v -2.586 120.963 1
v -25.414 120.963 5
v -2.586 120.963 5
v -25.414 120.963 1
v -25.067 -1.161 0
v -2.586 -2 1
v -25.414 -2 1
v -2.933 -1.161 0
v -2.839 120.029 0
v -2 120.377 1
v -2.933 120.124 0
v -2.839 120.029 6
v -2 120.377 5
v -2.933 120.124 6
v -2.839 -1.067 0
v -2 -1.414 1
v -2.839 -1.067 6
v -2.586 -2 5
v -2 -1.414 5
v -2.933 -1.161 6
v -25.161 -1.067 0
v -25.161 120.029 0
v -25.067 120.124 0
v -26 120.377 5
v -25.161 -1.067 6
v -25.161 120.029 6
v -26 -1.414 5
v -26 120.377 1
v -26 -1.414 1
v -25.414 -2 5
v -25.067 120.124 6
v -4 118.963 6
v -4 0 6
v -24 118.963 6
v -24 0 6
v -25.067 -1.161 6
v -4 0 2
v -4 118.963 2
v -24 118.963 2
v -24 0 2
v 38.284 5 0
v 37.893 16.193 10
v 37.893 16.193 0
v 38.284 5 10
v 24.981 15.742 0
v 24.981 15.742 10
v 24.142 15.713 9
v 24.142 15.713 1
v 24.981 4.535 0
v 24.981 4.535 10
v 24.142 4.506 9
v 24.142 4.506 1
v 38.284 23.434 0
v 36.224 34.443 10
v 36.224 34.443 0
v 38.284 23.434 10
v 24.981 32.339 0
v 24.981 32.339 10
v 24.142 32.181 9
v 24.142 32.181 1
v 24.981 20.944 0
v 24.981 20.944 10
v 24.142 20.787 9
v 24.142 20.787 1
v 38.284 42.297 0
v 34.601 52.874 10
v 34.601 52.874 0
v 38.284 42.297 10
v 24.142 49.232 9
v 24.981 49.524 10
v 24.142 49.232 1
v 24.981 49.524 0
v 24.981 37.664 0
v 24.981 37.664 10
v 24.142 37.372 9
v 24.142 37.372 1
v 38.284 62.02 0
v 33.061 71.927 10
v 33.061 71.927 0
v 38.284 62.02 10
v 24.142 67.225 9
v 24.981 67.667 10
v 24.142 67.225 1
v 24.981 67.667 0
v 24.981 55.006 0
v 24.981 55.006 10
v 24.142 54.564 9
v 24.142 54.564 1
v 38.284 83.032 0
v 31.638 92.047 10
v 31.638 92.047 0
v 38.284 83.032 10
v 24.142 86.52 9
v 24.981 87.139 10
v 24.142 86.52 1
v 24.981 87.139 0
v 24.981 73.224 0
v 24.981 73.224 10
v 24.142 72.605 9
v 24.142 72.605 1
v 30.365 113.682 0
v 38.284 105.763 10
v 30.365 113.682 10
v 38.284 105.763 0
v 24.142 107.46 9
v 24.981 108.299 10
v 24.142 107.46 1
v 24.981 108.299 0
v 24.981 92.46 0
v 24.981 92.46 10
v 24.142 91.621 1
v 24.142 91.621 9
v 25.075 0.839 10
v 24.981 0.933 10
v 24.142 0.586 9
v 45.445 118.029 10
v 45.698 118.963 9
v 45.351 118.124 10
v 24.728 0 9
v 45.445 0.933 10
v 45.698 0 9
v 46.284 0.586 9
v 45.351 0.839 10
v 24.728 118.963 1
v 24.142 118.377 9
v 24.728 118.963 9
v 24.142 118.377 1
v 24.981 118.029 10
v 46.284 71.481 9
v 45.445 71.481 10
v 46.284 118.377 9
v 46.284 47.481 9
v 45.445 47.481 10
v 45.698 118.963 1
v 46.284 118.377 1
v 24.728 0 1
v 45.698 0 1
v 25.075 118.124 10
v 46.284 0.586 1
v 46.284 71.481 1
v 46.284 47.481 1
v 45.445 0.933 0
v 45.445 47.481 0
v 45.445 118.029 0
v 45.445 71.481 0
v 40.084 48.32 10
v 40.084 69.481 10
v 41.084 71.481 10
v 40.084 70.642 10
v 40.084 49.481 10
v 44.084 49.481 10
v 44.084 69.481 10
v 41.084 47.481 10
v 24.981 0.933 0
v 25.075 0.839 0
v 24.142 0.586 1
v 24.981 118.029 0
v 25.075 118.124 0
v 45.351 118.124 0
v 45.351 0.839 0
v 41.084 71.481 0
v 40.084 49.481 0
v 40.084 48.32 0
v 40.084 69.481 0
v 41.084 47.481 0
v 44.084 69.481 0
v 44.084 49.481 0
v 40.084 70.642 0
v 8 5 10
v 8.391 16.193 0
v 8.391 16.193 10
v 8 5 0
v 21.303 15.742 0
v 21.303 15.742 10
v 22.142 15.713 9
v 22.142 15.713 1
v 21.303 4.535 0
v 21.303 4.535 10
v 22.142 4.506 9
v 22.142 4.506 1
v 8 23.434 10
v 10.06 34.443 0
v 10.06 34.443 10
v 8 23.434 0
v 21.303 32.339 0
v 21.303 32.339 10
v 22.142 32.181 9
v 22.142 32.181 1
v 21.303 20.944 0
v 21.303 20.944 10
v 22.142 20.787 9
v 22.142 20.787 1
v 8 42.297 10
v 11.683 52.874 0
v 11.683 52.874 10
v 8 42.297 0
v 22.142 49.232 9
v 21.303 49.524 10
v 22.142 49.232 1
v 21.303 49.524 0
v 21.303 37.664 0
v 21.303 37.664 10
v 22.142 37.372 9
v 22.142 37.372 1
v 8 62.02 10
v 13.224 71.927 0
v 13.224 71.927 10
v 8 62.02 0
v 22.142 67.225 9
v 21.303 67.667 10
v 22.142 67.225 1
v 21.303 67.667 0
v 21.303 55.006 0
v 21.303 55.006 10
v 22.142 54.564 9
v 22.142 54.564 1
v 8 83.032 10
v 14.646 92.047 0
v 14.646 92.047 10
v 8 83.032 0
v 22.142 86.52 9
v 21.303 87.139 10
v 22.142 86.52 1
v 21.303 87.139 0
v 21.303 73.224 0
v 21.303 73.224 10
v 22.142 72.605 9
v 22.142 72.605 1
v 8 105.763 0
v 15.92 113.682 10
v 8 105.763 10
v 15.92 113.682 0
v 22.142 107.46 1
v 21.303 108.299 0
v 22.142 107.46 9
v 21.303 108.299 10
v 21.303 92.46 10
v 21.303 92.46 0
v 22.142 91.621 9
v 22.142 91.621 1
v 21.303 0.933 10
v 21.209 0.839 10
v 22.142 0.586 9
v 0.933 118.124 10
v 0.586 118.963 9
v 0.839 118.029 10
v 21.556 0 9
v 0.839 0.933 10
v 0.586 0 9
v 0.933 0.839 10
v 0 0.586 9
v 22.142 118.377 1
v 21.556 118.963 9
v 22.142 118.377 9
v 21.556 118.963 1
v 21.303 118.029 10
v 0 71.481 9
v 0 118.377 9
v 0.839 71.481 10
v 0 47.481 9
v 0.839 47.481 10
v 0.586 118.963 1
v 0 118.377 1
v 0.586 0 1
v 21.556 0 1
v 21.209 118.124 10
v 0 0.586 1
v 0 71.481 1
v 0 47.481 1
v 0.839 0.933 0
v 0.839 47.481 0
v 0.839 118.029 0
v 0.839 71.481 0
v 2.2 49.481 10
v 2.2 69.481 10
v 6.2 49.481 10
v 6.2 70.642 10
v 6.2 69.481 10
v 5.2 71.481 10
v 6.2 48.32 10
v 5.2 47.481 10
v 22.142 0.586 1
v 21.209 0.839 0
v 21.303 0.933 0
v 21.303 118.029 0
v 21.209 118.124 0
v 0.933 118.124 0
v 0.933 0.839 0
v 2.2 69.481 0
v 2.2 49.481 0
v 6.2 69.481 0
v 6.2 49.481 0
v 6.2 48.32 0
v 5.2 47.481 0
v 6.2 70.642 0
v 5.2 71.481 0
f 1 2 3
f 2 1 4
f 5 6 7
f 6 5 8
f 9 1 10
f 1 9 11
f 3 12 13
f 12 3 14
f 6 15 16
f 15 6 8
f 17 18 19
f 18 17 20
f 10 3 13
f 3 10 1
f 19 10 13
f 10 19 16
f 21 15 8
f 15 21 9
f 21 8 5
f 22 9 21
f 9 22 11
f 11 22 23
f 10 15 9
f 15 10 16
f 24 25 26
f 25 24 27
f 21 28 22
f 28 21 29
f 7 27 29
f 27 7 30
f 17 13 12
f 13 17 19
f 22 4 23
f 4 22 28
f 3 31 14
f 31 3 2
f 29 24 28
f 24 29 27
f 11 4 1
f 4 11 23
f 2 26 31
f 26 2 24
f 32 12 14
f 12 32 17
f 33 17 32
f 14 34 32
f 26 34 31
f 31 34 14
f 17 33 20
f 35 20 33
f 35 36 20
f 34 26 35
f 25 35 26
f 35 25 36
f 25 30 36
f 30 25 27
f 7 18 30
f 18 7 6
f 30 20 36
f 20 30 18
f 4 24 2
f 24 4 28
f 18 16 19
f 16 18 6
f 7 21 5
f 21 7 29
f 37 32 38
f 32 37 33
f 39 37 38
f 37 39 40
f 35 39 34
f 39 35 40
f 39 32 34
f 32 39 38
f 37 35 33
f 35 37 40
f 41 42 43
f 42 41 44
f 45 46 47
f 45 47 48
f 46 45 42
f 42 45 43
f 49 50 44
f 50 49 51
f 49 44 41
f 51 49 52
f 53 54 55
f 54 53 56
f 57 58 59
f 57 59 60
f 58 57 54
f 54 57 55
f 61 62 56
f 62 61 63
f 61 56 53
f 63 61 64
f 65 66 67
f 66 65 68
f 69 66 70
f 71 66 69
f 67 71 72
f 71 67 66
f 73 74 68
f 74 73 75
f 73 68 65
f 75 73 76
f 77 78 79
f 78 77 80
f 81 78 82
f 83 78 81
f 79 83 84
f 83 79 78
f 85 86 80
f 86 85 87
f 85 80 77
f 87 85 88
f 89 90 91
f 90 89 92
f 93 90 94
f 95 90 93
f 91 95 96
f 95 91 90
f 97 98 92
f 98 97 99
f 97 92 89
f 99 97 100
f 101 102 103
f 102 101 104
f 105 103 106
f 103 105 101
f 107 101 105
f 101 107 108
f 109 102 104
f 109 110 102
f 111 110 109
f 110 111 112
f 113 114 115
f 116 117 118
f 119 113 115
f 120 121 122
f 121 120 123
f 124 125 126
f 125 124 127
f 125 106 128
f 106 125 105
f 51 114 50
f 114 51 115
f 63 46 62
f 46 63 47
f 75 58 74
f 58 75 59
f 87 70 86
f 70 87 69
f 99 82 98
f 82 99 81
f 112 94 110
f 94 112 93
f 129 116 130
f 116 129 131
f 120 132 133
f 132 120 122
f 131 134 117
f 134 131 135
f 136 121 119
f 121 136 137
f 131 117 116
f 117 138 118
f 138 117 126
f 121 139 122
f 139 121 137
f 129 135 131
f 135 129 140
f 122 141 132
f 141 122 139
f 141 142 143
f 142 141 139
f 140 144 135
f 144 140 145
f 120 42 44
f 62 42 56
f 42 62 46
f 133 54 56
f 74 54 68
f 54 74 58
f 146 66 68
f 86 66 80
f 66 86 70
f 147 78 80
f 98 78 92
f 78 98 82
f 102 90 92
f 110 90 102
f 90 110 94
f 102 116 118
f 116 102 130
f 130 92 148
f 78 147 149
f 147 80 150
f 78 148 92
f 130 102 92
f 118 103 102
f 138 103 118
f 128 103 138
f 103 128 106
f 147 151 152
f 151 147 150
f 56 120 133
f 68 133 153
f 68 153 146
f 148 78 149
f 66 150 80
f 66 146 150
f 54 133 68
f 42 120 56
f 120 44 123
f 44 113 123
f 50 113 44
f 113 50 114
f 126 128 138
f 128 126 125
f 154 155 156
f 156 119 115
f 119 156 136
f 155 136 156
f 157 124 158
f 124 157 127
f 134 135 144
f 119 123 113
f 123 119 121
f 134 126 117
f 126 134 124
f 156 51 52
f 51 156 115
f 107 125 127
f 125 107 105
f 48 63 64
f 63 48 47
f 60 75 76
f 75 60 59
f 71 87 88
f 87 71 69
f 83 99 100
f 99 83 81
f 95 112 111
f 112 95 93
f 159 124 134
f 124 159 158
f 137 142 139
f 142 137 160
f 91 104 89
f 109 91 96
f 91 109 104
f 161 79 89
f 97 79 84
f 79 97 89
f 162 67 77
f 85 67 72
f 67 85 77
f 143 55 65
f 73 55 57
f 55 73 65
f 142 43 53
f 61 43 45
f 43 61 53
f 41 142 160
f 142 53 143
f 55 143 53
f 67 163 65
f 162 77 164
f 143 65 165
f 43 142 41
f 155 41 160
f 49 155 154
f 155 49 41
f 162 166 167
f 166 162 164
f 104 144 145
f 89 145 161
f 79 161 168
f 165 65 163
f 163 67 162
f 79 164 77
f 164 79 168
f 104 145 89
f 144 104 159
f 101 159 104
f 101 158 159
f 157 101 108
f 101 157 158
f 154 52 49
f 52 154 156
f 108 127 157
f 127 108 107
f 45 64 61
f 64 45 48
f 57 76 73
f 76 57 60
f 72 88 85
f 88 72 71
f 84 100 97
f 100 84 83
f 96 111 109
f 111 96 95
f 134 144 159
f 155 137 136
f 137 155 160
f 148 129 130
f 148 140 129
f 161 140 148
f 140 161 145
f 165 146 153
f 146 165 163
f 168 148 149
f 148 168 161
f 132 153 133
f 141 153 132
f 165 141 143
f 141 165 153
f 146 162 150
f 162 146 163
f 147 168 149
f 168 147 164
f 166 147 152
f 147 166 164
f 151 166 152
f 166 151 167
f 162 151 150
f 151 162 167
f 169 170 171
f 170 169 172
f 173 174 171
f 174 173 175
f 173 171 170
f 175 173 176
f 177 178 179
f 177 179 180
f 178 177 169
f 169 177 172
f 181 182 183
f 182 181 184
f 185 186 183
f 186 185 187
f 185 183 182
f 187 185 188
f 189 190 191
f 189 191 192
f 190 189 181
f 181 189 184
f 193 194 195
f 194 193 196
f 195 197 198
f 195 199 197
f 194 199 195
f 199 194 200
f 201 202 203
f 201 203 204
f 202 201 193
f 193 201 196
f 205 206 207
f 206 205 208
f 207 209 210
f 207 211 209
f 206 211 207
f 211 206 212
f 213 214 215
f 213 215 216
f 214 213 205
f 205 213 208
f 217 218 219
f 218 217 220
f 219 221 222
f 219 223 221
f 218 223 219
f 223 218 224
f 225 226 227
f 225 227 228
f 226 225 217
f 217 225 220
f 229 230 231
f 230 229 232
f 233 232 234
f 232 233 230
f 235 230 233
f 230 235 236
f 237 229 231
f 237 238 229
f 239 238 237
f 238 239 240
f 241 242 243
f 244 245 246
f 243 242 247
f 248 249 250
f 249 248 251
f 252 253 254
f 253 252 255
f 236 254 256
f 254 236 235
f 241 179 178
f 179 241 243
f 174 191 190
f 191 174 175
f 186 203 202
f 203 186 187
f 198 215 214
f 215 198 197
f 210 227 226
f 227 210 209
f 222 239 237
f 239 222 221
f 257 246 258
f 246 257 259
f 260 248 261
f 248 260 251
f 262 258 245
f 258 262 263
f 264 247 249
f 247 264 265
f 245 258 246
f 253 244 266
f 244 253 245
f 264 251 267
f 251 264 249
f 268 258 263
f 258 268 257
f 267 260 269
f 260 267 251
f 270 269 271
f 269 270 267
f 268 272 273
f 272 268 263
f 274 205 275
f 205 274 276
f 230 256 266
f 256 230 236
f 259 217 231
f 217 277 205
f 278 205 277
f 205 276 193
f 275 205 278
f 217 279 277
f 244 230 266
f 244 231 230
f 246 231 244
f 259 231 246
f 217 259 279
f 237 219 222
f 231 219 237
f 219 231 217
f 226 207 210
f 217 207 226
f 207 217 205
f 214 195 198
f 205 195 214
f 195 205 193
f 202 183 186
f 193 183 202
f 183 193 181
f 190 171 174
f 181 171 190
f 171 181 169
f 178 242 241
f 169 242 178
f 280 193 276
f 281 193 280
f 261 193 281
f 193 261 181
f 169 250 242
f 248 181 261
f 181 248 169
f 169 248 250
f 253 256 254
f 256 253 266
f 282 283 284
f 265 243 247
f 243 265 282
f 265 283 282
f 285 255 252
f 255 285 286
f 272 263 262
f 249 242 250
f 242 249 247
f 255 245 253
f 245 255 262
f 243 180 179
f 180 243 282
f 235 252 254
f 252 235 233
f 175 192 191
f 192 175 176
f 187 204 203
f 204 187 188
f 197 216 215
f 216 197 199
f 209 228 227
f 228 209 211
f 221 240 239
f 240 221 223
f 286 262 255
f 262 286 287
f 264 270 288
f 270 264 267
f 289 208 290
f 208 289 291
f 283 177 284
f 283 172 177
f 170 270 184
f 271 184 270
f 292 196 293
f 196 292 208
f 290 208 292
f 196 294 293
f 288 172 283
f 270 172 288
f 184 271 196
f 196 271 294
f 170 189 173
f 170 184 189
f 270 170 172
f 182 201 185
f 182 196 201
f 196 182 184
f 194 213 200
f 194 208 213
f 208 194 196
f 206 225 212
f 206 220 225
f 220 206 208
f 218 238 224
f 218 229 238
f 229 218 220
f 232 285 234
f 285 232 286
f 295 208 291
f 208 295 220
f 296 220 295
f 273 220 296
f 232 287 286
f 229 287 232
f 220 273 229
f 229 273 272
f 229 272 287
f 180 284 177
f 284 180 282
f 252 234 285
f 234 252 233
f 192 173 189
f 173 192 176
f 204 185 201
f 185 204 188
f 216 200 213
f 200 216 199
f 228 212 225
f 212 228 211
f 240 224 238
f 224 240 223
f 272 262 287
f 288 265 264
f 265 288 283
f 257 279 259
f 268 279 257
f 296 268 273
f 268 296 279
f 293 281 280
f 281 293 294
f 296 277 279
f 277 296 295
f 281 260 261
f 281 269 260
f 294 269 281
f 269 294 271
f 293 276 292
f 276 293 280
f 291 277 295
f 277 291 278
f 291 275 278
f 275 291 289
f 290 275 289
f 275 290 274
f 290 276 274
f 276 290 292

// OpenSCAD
// Title: MultiStand
// Author: http://www.thingiverse.com/Jinja
// Date: 29/1/2013

/////////// START OF PARAMETERS /////////////////

// The thickness of your tablet. This will determine the size of the slots your tablet will fit into. mm =
tablet_thickness = 11.2;

// The height of your tablet. If you only want landscape, then use the short length. Otherwise use the long length. mm =
tablet_height = 190;

// How deep each slot will be, just under 10% of your tablet height is a good guide. mm =
slot_depth = 10.0;

// Increase the length of your stand to get more slots, % =
extra_length_percent=0; //[0:100]

// How many lids do you want for your stand. 
number_of_lids = 1; // [1:OneLid, 2:TwoLids]

// How wide in mm each rest will be. mm =
stand_width = 10; //[6:20]

// To discover the calibration value of your printer, first print out the lid. Then print out the calibration rest which will fit onto the lid. If the fit is too loose then increase the calibration and try again. If the fit is too tight then decrease the calibration value. I suggest printing out CalibrationRests for values 0, 2 & 4 simultaneously and go from there. When you've found your value then you can print out the full sized Rest. Zero means your printer is perfectly calibrated. Value = 
calibration = 0;//[-8:8]

// Select which STL plate you want to create. 
plate = "FullPlate"; //[ Lid, CalibrationRest, Rest, FullPlate ]

// Choose the pattern for the lid. For speed, use the circle to iterate on positioning before choosing the pattern you want. This is because the circle is faster to process. In fact, the list is ordered from fast to slow.
patternID = 0; // [0:NoPattern, 1:Circle, 4:Fish, 3:Apple, 5:Makerbot, 2:Android]

// Offset the pattern in the X axis. mm =
pattern_offset_x = 0; //[-20:20]

// Offset the pattern in the Y axis. mm =
pattern_offset_y = 0; //[-20:20]

// The size of the pattern. mm =
pattern_size = 35; //[8:60]

// Spacing percentage. 100=no overlap. Less than 100 means some overlap. More than 100 means more space between the patterns. % =
pattern_overlap_percent = 105; //[50:150]

// preview[view:south, tilt:top]

/////////// END OF PARAMETERS /////////////////
// not parameters, do not change
pattern_overlap = pattern_overlap_percent/100;
overhang = 40*1;  // the angle of overhang your printer can manage (no need to exceed 45)
rounded = 1*1;    // the mm width of the bevelled edge
rear_buf = 5*1;
front_buf = 2+tablet_thickness;

holder_height = 6*1;
holder_thick = 2*1;

extra_length=1+ (extra_length_percent/100);
base_min = holder_height+2;
height = base_min+slot_depth/sin(45);
slot_range = tablet_height*sin(45)*0.75*extra_length;
depth = rear_buf+slot_range + front_buf;
spacing = (1.1*tablet_thickness)/sin(45);
num_slots = floor(slot_range/spacing);
buffer = (calibration)*0.05;

calib_width = 2*(stand_width+holder_thick)+4;

if( plate == "Calibration" )
{
	test_stand();
	translate([-7,12,0])
	holder(3, 20, 0, 0);
}
else if( plate == "CalibrationRest" )
{
//		translate([0,-depth*0.5+5+holder_thick+2,0])
//		final_stand(number_of_lids);
	difference()
	{
	intersection()
	{
		translate([0,-depth*0.5+stand_width+holder_thick+2,0])
		final_stand(1);
		cube([holder_height+2,calib_width,5]);
	}

	for(i=[-8:1:8])
	{
		translate([holder_height+2,(0.5+(i/16))*calib_width,5*0.5])
		cube([calib_width/32,calib_width/32,calib_width/32],true);
	}
	for(i=[-8:8:8])
	{
		translate([holder_height+2,(0.5+(i/16))*calib_width,5*0.3])
		cube([calib_width/32,calib_width/32,calib_width/32],true);
	}
	translate([holder_height+2,(0.5+(calibration/16))*calib_width,5*0.7])
	cube([calib_width/32,calib_width/32,calib_width/32],true);
	}
}
else if( number_of_lids == 1 )
{
   if( plate == "FullPlate" )
	{
		translate([-(stand_width+holder_thick)-2,depth*0.5,0])
		holder(stand_width, depth, 0, patternID);
	
		translate([2*height+2,0,0])
		scale([-1,1,1])
		final_stand(number_of_lids);
	
		translate([0,0,0])
		final_stand(number_of_lids);
	}
	else if ( plate == "Lid" )
	{
		translate([-(stand_width+holder_thick)-2,depth*0.5,0])
		holder(stand_width, depth, 0, patternID);
	}
	else if ( plate == "Rest" )
	{
		final_stand(number_of_lids);
	}
}
else if ( number_of_lids == 2 )
{
   if( plate == "FullPlate" )
	{
		translate([3*-(stand_width+holder_thick)-4,depth*0.5,0])
		holder(stand_width, depth, 0, patternID);
	
		translate([-(stand_width+holder_thick)-2,depth*0.5,0])
		holder(stand_width, depth, 0, patternID);
	
		translate([2*height+2,0,0])
		scale([-1,1,1])
		final_stand(number_of_lids);
	
		translate([0,0,0])
		final_stand(number_of_lids);
	}
	else if ( plate == "Lid" )
	{
		translate([-(stand_width+holder_thick)-2,depth*0.5,0])
		holder(stand_width, depth, 0, patternID);
	}
	else if ( plate == "Rest" )
	{
		final_stand(number_of_lids);
	}

}


$fs=0.3;
//$fa=5; //smooth
$fa=10; //not so smooth
//$fa=20; //rough

module lid_cutter(pos, patternID )
{
	translate([0.2,depth*0.5,0])
	rotate([90,0,90])
	holder(stand_width, depth, buffer, patternID);

	translate([-1,depth*0.5,0])
	rotate([90,0,90])
	holder(stand_width, depth, buffer, patternID);
}

module test_stand()
{
	step = 13;
	difference()
	{
		minkowski()
		{
			translate([rounded, rounded, rounded])
			cube([11, 8*step+2, 1]);
			diamond(rounded);
		}
	for(i=[0:1:7])
	{
		translate([0,i*step+8,0])
		rotate( [90,0,90] )
   	holder( 3, 20, 0.0+(i*0.05) );
		translate([-1,i*step+8,0])
		rotate( [90,0,90] )
   	holder( 3, 20, 0.0+(i*0.05) );
		
		translate([7,i*step+4,1])
		{
			if(i==0)
			{
				write("1",h=8,t=4);
			}
			else if(i==1)
			{
				write("2",h=8,t=4);
			}
			else if(i==2)
			{
				write("3",h=8,t=4);
			}
			else if(i==3)
			{
				write("4",h=8,t=4);
			}
			else if(i==4)
			{
				write("5",h=8,t=4);
			}
			else if(i==5)
			{
				write("6",h=8,t=4);
			}
			else if(i==6)
			{
				write("7",h=8,t=4);
			}
			else if(i==7)
			{
				write("8",h=8,t=4);
			}
		}

	}
	}
}

module final_stand(number_of_lids)
{
	pos = -stand_width*2;
	if( number_of_lids == 1 )
	{
		difference()
		{
			stand2();
			lid_cutter(pos,0);
		}
	}
	else if (number_of_lids == 2 )
	{
		difference()
		{
			stand2();
			translate([0,depth*0.25,0])	
			lid_cutter(pos,0);
			translate([0,depth*-0.25,0])	
			lid_cutter(pos,0);
		}
	}
}

module right_stand(number_of_lids)
{
//	pos = -stand_width;
	pos = -stand_width*2;
	if( number_of_lids == 1 )
	{
		difference()
		{
			stand();
			lid_cutter(pos,0);
		}
	}
	else if (number_of_lids == 2 )
	{
		difference()
		{
			stand();
			translate([0,depth*0.25,0])	
			lid_cutter(pos,0);
			translate([0,depth*-0.25,0])	
			lid_cutter(pos,0);
		}
	}

}

module left_stand(number_of_lids)
{
//	pos = -depth-2*holder_thick;
	pos = -stand_width*2;
	if( number_of_lids == 1 )
	{
		difference()
		{
			stand();
			lid_cutter(pos,0);
		}
	}
	else if (number_of_lids == 2 )
	{
		difference()
		{
			stand();

			translate([0,depth*0.25,0])	
			lid_cutter(pos,0);
			translate([0,depth*-0.25,0])	
			lid_cutter(pos,0);
		}
	}
}

module holder(stand_width, depth, outerextra, patternID)
{
	difference()
	{
		minkowski()
		{
			translate([0, 0, (holder_height+outerextra)*0.5])
			cube([(stand_width+holder_thick+outerextra)*2-(2*rounded), depth+2*(outerextra+holder_thick)-(2*rounded), holder_height+outerextra-(2*rounded)],true);
			diamond(rounded);
		}
		translate([0, 0, holder_thick+holder_height*0.5 + outerextra])
		cube([(stand_width-outerextra)*2, depth-2*outerextra, holder_height+outerextra],true);

		if( patternID > 0 )
		{
			pattern(stand_width, depth, outerextra, patternID );
		}
	}
}

module pattern(stand_width, depth, extra, patternID)
{
	xoffset = pattern_offset_x;
	yoffset = pattern_offset_y;
	steps = pattern_size;
	radius = steps*0.45;
	overlap = pattern_overlap;
	intersection()
	{
		for(x=[xoffset-10:steps*overlap:(stand_width+holder_thick+extra)*2-(2*rounded)+(steps)+xoffset+10])
		{
			for(y=[yoffset-10:steps*overlap:depth+2*(extra+holder_thick)-(2*rounded)+(steps)+yoffset+10])
			{
				translate([-stand_width*2, -0.5*(depth+2*(extra+holder_thick)-(2*rounded)), 0])
				translate([x,y,-1])
				rotate([0,0,x*57+y*79])
				pattern_shape( radius, 10, patternID );
//				android( radius*2, 10 );
//				cylinder(10, radius, radius);
			}
		}
		translate([0, 0, (holder_height+extra)*0.5])
		cube([(stand_width+extra)*2, depth+2*extra, holder_height*3],true);
	}
}

module stand2()
{
	final_spacing = slot_range/(num_slots);
	between = (final_spacing - tablet_thickness);
	adj_spacing = final_spacing - (between/num_slots);
	difference()
	{
		minkowski()
		{
			translate([rounded-buffer, rounded-buffer, rounded])
			cube([height-(2*rounded), depth-(2*rounded)-(2*buffer)-(2*buffer), stand_width-(2*rounded)-(2*buffer)]);
			diamond(rounded);
		}
		if( num_slots > 7 )
		{

			for(i=[0:1:(num_slots)])
			{
				
				translate([base_min,(i*adj_spacing)+rear_buf+(((i/num_slots)*(i/num_slots)*(i/num_slots)*(i/num_slots)*(i/num_slots)*(i/num_slots))*between),-0.1])
				rotate([0,0,-(0+i*(45/(num_slots)))])
				cube([height*2, tablet_thickness, stand_width-2*buffer+0.2]);
			}
		}
		else if( num_slots > 5 )
		{
			for(i=[0:1:(num_slots)])
			{
				
				translate([base_min,(i*adj_spacing)+rear_buf+(((i/num_slots)*(i/num_slots)*(i/num_slots)*(i/num_slots)*(i/num_slots))*between),-0.1])
				rotate([0,0,-(0+i*(45/(num_slots)))])
				cube([height*2, tablet_thickness, stand_width-2*buffer+0.2]);
			}
		}
		else
		{
			for(i=[0:1:(num_slots)])
			{
				
				translate([base_min,(i*adj_spacing)+rear_buf+(((i/num_slots)*(i/num_slots)*(i/num_slots))*between),-0.1])
				rotate([0,0,-(2+i*(43/(num_slots)))])
				cube([height*2, tablet_thickness, stand_width-2*buffer+0.2]);
			}
		}
	}
}

module cutter(dist, overhang)
{
	size = dist*2;

	translate([dist,-dist,-dist])
	cube([size,size,size]);

	translate([-dist-size,-dist,-dist])
	cube([size,size,size]);

	translate([dist,-dist,0])
	rotate([0,-overhang,0])
	cube([size,size,size]);

	translate([-dist,-dist,0])
	rotate([0,-90+overhang,0])
	cube([size,size,size]);

	translate([dist,-dist,0])
	rotate([0,90+overhang,0])
	cube([size,size,size]);

	translate([-dist,-dist,0])
	rotate([0,180-overhang,0])
	cube([size,size,size]);

}

module diamond( rounded )
{
	dist = rounded;
	difference()
	{
		cube([2*rounded,2*rounded,2*rounded], true);
		for(i=[0:45:179])
		{
			rotate([0,0,i])
			cutter(dist, overhang);
		}
	}
}

//translate([0,0,30])
//android( 20, 4 );

module android( oheight, depth )
{
	scale = 1.1;
	height = oheight*scale;
	width = height*0.4;
	gap = height*0.03;
	radius = height*0.045;

//	cube( [ oheight,2,oheight] );

	translate( [-oheight*0.5,oheight*0.5,0])
	rotate([90,0,0])
	translate( [-(height-oheight)*0.5,-depth-1,-height*0.14])
	{
	translate( [(height-width)*0.5+radius,depth,(height-width)*0.5+radius])

/*	minkowski()
	{
		translate([0,0,0])
		cube( [ width-(2*radius),depth-1,width-(2*radius)] );
		rotate([-90,0,0])
		cylinder( 1, radius, radius );
	}*/

	hull()
	{
		translate([0,0,0])
		rotate([-90,0,0])
		cylinder( depth, radius, radius );

		translate([width-(2*radius),0,0])
		rotate([-90,0,0])
		cylinder( depth, radius, radius );

/*		translate([width-(2*radius),0,width-(2*radius)])
		rotate([-90,0,0])
		cylinder( depth, radius, radius );

		translate([0,0,width-(2*radius)])
		rotate([-90,0,0])
		cylinder( depth, radius, radius );*/

		translate( [-((height-width)*0.5+radius),-depth,-((height-width)*0.5+radius)])
		translate( [(height-width)*0.5,depth,(height)*0.5])
		cube( [ width,depth,width*0.5] );

	}


	translate( [height*0.5,depth,(height+width)*0.5+gap])

	rotate([-90,0,0])
	difference()
	{
		cylinder( depth, width*0.5, width*0.5 );
		translate([-width*0.5,0,0])
		cube( [width,width,depth]);
		if(radius*0.25>0.7)
		{
			translate([-radius*2,-radius*2,0])
			cylinder( depth, radius*0.5, radius*0.5 );
			translate([radius*2,-radius*2,0])
			cylinder( depth, radius*0.5, radius*0.5 );

			// the next two cubes are the things that keep the eyes in place
			translate([-radius*2,-radius*2,0])
			rotate([0,0,-135])
			translate([0,radius*-0.125,0])
			cube([radius*2,radius*0.25,depth]);
		
			translate([radius*2,-radius*2,0])
			rotate([0,0,-45])
			translate([0,radius*-0.125,0])
			cube([radius*2,radius*0.25,depth]);
		}
	}
			

	translate( [((height-width)*0.5)-radius-gap,depth,((height+width)*0.5)-radius])
	arm(radius,depth);
	translate( [((height+width)*0.5)+radius+gap,depth,((height+width)*0.5)-radius])
	arm(radius,depth);

	translate( [(height*0.5)+(1.8*radius),depth,(height*0.4)])
	arm(radius,depth);
	translate( [(height*0.5)-(1.8*radius),depth,(height*0.4)])
	arm(radius,depth);

	translate([height*0.5+width*0.35,depth,height*0.95])
	rotate([0,40,0])
	arm(radius*0.3,depth);

	translate([height*0.5-width*0.35,depth,height*0.95])
	rotate([0,-40,0])
	arm(radius*0.3,depth);
	}
}

module arm(radius,depth)
{
	hull()
	{
		rotate([-90,0,0])
		cylinder(depth,radius,radius);
		translate([0,0,-4.7*radius])
		rotate([-90,0,0])
		cylinder(depth,radius,radius);
	}
}


/*translate([0,0,20])
pattern_shape(10, 5, 1);

translate([0,0,30])
pattern_shape(10, 5, 2);

translate([0,0,40])
pattern_shape(10, 5, 3);

translate([0,0,50])
pattern_shape(10, 5, 4);

translate([0,0,60])
pattern_shape(10, 5, 5);
*/

module pattern_shape( radius, height, patternID )
{
	if( patternID == 1 )
	{
		cylinder(height, radius, radius);
	}
	else if (patternID == 2)
	{
		android(radius*2, height);
	}
	else if (patternID == 3)
	{
		apple( radius, height );
	}
	else if (patternID == 4)
	{
		fish( radius, height );
	}
	else if (patternID == 5)
	{
		makerbot_logo( radius, height );
	}
}

module apple(radius, depth)
{
	fish_scale = 0.22 * (radius/5);
	fish_height = depth/fish_scale;

	difference()
	{
		translate( [-radius*0.9,0,depth*0.5] )
		scale(fish_scale)
		translate( [20,0,0] )
		linear_extrude(height = fish_height, center = true)
		polygon([[0,-15],[-4,-16],[-7,-16],[-10,-14],[-12,-11],[-15,-5],[-17,3],[-17,7],[-16,11],[-15,13],[-13,15],[-9,16],[-5,16],[-3,15],[0,14],[3,15],[5,16],[9,16],[13,15],[15,13],[16,11],[17,7],[17,3],[15,-5],[12,-11],[10,-14],[7,-16],[4,-16]]);

		translate( [radius*0.8,radius*0.2,0] )
		cylinder(depth, radius*0.4, radius*0.4);
	}

	translate( [-radius*0.9,0,depth*0.5] )
	scale(fish_scale)
	translate( [20,0,0] )
	linear_extrude(height = fish_height, center = true)
	polygon([[0,20],[0,17],[3,17],[6,18],[7,19],[8,20],[9,23],[9,26],[9,26],[6,26],[3,25],[2,24],[1,23]]);


}

module fish(radius, depth)
{
	fish_scale = 0.22 * (radius/5);
	fish_height = depth/fish_scale;
	translate( [-radius*0.9,0,depth*0.5] )
	scale(fish_scale)
	translate( [43,-12,0] )
	linear_extrude(height = fish_height, center = true)
	polygon([[-45,12],[-41,16],[-38,18],[-34,20],[-30,21],[-25,21],[-21,20],[-19,19],[-16,17],[-14,14],[-13,15],[-12,18],[-9,21],[-4,22],[-6,19],[-8,17],[-9,13],[-9,11],[-8,7],[-6,5],[-4,2],[-9,3],[-12,6],[-13,9],[-14,10],[-16,7],[-19,5],[-21,4],[-25,3],[-30,3],[-34,4],[-38,6],[-41,8]]);
}

module makerbot_logo(radius, height)
{
	width=radius*0.13;
	cut=width*1.3;
	angle=asin(cut/radius);
	aangle=0;
	x1=(radius-width*0.5)*sin(angle+aangle);
	y1=(radius-width*0.5)*cos(angle+aangle);
	x2=(radius-width*0.5)*sin(-angle+aangle);
	y2=(radius-width*0.5)*cos(-angle+aangle);
	mwidth=width*1.8;
	mgap=width*1.3;
	mheight = radius*1.3;

	difference()
	{
		cylinder(height, radius, radius);
		cylinder(height, radius-width, radius-width);
		translate([0,0,height*0.5])
		rotate([0,0,-aangle])
		{
			cube([2*radius,cut+width,height],true);
			cube([cut+width,2*radius,height],true);
		}
	}

	translate([x1,y1,0])
	cylinder(height, width*0.5, width*0.5);
	translate([y1,-x1,0])
	cylinder(height, width*0.5, width*0.5);
	translate([-y1,x1,0])
	cylinder(height, width*0.5, width*0.5);
	translate([-x1,-y1,0])
	cylinder(height, width*0.5, width*0.5);
	translate([x2,y2,0])
	cylinder(height, width*0.5, width*0.5);
	translate([y2,-x2,0])
	cylinder(height, width*0.5, width*0.5);
	translate([-y2,x2,0])
	cylinder(height, width*0.5, width*0.5);
	translate([-x2,-y2,0])
	cylinder(height, width*0.5, width*0.5);


	translate([0,mwidth*-0.25,height*0.5])	
	cube([mwidth,mheight-1.5*mwidth,height],true);
	translate([mwidth+mgap,mwidth*-0.25,height*0.5])
	cube([mwidth,mheight-1.5*mwidth,height],true);
	translate([-mwidth-mgap,mwidth*-0.25,height*0.5])
	cube([mwidth,mheight-1.5*mwidth,height],true);
	translate([0,(mheight-mwidth)*0.5,height*0.5])	
	cube([mwidth+2*mgap,mwidth,height],true);

	translate([-mgap-mwidth*0.5,mheight*0.5-mwidth,0])
	difference()
	{
		cylinder(height,mwidth,mwidth);
		translate([0,-mwidth,0])
		cube([mwidth,mwidth,height]);
	}

	translate([mgap+mwidth*0.5,mheight*0.5-mwidth,0])
	difference()
	{
		cylinder(height,mwidth,mwidth);
		translate([-mwidth,-mwidth,0])
		cube([mwidth,mwidth,height]);
	}

	translate([-mwidth-mgap,-(mheight-mwidth)*0.5,0])
	cylinder(height,mwidth*0.5,mwidth*0.5);

	translate([0,-(mheight-mwidth)*0.5,0])
	cylinder(height,mwidth*0.5,mwidth*0.5);

	translate([mwidth+mgap,-(mheight-mwidth)*0.5,0])
	cylinder(height,mwidth*0.5,mwidth*0.5);

}
